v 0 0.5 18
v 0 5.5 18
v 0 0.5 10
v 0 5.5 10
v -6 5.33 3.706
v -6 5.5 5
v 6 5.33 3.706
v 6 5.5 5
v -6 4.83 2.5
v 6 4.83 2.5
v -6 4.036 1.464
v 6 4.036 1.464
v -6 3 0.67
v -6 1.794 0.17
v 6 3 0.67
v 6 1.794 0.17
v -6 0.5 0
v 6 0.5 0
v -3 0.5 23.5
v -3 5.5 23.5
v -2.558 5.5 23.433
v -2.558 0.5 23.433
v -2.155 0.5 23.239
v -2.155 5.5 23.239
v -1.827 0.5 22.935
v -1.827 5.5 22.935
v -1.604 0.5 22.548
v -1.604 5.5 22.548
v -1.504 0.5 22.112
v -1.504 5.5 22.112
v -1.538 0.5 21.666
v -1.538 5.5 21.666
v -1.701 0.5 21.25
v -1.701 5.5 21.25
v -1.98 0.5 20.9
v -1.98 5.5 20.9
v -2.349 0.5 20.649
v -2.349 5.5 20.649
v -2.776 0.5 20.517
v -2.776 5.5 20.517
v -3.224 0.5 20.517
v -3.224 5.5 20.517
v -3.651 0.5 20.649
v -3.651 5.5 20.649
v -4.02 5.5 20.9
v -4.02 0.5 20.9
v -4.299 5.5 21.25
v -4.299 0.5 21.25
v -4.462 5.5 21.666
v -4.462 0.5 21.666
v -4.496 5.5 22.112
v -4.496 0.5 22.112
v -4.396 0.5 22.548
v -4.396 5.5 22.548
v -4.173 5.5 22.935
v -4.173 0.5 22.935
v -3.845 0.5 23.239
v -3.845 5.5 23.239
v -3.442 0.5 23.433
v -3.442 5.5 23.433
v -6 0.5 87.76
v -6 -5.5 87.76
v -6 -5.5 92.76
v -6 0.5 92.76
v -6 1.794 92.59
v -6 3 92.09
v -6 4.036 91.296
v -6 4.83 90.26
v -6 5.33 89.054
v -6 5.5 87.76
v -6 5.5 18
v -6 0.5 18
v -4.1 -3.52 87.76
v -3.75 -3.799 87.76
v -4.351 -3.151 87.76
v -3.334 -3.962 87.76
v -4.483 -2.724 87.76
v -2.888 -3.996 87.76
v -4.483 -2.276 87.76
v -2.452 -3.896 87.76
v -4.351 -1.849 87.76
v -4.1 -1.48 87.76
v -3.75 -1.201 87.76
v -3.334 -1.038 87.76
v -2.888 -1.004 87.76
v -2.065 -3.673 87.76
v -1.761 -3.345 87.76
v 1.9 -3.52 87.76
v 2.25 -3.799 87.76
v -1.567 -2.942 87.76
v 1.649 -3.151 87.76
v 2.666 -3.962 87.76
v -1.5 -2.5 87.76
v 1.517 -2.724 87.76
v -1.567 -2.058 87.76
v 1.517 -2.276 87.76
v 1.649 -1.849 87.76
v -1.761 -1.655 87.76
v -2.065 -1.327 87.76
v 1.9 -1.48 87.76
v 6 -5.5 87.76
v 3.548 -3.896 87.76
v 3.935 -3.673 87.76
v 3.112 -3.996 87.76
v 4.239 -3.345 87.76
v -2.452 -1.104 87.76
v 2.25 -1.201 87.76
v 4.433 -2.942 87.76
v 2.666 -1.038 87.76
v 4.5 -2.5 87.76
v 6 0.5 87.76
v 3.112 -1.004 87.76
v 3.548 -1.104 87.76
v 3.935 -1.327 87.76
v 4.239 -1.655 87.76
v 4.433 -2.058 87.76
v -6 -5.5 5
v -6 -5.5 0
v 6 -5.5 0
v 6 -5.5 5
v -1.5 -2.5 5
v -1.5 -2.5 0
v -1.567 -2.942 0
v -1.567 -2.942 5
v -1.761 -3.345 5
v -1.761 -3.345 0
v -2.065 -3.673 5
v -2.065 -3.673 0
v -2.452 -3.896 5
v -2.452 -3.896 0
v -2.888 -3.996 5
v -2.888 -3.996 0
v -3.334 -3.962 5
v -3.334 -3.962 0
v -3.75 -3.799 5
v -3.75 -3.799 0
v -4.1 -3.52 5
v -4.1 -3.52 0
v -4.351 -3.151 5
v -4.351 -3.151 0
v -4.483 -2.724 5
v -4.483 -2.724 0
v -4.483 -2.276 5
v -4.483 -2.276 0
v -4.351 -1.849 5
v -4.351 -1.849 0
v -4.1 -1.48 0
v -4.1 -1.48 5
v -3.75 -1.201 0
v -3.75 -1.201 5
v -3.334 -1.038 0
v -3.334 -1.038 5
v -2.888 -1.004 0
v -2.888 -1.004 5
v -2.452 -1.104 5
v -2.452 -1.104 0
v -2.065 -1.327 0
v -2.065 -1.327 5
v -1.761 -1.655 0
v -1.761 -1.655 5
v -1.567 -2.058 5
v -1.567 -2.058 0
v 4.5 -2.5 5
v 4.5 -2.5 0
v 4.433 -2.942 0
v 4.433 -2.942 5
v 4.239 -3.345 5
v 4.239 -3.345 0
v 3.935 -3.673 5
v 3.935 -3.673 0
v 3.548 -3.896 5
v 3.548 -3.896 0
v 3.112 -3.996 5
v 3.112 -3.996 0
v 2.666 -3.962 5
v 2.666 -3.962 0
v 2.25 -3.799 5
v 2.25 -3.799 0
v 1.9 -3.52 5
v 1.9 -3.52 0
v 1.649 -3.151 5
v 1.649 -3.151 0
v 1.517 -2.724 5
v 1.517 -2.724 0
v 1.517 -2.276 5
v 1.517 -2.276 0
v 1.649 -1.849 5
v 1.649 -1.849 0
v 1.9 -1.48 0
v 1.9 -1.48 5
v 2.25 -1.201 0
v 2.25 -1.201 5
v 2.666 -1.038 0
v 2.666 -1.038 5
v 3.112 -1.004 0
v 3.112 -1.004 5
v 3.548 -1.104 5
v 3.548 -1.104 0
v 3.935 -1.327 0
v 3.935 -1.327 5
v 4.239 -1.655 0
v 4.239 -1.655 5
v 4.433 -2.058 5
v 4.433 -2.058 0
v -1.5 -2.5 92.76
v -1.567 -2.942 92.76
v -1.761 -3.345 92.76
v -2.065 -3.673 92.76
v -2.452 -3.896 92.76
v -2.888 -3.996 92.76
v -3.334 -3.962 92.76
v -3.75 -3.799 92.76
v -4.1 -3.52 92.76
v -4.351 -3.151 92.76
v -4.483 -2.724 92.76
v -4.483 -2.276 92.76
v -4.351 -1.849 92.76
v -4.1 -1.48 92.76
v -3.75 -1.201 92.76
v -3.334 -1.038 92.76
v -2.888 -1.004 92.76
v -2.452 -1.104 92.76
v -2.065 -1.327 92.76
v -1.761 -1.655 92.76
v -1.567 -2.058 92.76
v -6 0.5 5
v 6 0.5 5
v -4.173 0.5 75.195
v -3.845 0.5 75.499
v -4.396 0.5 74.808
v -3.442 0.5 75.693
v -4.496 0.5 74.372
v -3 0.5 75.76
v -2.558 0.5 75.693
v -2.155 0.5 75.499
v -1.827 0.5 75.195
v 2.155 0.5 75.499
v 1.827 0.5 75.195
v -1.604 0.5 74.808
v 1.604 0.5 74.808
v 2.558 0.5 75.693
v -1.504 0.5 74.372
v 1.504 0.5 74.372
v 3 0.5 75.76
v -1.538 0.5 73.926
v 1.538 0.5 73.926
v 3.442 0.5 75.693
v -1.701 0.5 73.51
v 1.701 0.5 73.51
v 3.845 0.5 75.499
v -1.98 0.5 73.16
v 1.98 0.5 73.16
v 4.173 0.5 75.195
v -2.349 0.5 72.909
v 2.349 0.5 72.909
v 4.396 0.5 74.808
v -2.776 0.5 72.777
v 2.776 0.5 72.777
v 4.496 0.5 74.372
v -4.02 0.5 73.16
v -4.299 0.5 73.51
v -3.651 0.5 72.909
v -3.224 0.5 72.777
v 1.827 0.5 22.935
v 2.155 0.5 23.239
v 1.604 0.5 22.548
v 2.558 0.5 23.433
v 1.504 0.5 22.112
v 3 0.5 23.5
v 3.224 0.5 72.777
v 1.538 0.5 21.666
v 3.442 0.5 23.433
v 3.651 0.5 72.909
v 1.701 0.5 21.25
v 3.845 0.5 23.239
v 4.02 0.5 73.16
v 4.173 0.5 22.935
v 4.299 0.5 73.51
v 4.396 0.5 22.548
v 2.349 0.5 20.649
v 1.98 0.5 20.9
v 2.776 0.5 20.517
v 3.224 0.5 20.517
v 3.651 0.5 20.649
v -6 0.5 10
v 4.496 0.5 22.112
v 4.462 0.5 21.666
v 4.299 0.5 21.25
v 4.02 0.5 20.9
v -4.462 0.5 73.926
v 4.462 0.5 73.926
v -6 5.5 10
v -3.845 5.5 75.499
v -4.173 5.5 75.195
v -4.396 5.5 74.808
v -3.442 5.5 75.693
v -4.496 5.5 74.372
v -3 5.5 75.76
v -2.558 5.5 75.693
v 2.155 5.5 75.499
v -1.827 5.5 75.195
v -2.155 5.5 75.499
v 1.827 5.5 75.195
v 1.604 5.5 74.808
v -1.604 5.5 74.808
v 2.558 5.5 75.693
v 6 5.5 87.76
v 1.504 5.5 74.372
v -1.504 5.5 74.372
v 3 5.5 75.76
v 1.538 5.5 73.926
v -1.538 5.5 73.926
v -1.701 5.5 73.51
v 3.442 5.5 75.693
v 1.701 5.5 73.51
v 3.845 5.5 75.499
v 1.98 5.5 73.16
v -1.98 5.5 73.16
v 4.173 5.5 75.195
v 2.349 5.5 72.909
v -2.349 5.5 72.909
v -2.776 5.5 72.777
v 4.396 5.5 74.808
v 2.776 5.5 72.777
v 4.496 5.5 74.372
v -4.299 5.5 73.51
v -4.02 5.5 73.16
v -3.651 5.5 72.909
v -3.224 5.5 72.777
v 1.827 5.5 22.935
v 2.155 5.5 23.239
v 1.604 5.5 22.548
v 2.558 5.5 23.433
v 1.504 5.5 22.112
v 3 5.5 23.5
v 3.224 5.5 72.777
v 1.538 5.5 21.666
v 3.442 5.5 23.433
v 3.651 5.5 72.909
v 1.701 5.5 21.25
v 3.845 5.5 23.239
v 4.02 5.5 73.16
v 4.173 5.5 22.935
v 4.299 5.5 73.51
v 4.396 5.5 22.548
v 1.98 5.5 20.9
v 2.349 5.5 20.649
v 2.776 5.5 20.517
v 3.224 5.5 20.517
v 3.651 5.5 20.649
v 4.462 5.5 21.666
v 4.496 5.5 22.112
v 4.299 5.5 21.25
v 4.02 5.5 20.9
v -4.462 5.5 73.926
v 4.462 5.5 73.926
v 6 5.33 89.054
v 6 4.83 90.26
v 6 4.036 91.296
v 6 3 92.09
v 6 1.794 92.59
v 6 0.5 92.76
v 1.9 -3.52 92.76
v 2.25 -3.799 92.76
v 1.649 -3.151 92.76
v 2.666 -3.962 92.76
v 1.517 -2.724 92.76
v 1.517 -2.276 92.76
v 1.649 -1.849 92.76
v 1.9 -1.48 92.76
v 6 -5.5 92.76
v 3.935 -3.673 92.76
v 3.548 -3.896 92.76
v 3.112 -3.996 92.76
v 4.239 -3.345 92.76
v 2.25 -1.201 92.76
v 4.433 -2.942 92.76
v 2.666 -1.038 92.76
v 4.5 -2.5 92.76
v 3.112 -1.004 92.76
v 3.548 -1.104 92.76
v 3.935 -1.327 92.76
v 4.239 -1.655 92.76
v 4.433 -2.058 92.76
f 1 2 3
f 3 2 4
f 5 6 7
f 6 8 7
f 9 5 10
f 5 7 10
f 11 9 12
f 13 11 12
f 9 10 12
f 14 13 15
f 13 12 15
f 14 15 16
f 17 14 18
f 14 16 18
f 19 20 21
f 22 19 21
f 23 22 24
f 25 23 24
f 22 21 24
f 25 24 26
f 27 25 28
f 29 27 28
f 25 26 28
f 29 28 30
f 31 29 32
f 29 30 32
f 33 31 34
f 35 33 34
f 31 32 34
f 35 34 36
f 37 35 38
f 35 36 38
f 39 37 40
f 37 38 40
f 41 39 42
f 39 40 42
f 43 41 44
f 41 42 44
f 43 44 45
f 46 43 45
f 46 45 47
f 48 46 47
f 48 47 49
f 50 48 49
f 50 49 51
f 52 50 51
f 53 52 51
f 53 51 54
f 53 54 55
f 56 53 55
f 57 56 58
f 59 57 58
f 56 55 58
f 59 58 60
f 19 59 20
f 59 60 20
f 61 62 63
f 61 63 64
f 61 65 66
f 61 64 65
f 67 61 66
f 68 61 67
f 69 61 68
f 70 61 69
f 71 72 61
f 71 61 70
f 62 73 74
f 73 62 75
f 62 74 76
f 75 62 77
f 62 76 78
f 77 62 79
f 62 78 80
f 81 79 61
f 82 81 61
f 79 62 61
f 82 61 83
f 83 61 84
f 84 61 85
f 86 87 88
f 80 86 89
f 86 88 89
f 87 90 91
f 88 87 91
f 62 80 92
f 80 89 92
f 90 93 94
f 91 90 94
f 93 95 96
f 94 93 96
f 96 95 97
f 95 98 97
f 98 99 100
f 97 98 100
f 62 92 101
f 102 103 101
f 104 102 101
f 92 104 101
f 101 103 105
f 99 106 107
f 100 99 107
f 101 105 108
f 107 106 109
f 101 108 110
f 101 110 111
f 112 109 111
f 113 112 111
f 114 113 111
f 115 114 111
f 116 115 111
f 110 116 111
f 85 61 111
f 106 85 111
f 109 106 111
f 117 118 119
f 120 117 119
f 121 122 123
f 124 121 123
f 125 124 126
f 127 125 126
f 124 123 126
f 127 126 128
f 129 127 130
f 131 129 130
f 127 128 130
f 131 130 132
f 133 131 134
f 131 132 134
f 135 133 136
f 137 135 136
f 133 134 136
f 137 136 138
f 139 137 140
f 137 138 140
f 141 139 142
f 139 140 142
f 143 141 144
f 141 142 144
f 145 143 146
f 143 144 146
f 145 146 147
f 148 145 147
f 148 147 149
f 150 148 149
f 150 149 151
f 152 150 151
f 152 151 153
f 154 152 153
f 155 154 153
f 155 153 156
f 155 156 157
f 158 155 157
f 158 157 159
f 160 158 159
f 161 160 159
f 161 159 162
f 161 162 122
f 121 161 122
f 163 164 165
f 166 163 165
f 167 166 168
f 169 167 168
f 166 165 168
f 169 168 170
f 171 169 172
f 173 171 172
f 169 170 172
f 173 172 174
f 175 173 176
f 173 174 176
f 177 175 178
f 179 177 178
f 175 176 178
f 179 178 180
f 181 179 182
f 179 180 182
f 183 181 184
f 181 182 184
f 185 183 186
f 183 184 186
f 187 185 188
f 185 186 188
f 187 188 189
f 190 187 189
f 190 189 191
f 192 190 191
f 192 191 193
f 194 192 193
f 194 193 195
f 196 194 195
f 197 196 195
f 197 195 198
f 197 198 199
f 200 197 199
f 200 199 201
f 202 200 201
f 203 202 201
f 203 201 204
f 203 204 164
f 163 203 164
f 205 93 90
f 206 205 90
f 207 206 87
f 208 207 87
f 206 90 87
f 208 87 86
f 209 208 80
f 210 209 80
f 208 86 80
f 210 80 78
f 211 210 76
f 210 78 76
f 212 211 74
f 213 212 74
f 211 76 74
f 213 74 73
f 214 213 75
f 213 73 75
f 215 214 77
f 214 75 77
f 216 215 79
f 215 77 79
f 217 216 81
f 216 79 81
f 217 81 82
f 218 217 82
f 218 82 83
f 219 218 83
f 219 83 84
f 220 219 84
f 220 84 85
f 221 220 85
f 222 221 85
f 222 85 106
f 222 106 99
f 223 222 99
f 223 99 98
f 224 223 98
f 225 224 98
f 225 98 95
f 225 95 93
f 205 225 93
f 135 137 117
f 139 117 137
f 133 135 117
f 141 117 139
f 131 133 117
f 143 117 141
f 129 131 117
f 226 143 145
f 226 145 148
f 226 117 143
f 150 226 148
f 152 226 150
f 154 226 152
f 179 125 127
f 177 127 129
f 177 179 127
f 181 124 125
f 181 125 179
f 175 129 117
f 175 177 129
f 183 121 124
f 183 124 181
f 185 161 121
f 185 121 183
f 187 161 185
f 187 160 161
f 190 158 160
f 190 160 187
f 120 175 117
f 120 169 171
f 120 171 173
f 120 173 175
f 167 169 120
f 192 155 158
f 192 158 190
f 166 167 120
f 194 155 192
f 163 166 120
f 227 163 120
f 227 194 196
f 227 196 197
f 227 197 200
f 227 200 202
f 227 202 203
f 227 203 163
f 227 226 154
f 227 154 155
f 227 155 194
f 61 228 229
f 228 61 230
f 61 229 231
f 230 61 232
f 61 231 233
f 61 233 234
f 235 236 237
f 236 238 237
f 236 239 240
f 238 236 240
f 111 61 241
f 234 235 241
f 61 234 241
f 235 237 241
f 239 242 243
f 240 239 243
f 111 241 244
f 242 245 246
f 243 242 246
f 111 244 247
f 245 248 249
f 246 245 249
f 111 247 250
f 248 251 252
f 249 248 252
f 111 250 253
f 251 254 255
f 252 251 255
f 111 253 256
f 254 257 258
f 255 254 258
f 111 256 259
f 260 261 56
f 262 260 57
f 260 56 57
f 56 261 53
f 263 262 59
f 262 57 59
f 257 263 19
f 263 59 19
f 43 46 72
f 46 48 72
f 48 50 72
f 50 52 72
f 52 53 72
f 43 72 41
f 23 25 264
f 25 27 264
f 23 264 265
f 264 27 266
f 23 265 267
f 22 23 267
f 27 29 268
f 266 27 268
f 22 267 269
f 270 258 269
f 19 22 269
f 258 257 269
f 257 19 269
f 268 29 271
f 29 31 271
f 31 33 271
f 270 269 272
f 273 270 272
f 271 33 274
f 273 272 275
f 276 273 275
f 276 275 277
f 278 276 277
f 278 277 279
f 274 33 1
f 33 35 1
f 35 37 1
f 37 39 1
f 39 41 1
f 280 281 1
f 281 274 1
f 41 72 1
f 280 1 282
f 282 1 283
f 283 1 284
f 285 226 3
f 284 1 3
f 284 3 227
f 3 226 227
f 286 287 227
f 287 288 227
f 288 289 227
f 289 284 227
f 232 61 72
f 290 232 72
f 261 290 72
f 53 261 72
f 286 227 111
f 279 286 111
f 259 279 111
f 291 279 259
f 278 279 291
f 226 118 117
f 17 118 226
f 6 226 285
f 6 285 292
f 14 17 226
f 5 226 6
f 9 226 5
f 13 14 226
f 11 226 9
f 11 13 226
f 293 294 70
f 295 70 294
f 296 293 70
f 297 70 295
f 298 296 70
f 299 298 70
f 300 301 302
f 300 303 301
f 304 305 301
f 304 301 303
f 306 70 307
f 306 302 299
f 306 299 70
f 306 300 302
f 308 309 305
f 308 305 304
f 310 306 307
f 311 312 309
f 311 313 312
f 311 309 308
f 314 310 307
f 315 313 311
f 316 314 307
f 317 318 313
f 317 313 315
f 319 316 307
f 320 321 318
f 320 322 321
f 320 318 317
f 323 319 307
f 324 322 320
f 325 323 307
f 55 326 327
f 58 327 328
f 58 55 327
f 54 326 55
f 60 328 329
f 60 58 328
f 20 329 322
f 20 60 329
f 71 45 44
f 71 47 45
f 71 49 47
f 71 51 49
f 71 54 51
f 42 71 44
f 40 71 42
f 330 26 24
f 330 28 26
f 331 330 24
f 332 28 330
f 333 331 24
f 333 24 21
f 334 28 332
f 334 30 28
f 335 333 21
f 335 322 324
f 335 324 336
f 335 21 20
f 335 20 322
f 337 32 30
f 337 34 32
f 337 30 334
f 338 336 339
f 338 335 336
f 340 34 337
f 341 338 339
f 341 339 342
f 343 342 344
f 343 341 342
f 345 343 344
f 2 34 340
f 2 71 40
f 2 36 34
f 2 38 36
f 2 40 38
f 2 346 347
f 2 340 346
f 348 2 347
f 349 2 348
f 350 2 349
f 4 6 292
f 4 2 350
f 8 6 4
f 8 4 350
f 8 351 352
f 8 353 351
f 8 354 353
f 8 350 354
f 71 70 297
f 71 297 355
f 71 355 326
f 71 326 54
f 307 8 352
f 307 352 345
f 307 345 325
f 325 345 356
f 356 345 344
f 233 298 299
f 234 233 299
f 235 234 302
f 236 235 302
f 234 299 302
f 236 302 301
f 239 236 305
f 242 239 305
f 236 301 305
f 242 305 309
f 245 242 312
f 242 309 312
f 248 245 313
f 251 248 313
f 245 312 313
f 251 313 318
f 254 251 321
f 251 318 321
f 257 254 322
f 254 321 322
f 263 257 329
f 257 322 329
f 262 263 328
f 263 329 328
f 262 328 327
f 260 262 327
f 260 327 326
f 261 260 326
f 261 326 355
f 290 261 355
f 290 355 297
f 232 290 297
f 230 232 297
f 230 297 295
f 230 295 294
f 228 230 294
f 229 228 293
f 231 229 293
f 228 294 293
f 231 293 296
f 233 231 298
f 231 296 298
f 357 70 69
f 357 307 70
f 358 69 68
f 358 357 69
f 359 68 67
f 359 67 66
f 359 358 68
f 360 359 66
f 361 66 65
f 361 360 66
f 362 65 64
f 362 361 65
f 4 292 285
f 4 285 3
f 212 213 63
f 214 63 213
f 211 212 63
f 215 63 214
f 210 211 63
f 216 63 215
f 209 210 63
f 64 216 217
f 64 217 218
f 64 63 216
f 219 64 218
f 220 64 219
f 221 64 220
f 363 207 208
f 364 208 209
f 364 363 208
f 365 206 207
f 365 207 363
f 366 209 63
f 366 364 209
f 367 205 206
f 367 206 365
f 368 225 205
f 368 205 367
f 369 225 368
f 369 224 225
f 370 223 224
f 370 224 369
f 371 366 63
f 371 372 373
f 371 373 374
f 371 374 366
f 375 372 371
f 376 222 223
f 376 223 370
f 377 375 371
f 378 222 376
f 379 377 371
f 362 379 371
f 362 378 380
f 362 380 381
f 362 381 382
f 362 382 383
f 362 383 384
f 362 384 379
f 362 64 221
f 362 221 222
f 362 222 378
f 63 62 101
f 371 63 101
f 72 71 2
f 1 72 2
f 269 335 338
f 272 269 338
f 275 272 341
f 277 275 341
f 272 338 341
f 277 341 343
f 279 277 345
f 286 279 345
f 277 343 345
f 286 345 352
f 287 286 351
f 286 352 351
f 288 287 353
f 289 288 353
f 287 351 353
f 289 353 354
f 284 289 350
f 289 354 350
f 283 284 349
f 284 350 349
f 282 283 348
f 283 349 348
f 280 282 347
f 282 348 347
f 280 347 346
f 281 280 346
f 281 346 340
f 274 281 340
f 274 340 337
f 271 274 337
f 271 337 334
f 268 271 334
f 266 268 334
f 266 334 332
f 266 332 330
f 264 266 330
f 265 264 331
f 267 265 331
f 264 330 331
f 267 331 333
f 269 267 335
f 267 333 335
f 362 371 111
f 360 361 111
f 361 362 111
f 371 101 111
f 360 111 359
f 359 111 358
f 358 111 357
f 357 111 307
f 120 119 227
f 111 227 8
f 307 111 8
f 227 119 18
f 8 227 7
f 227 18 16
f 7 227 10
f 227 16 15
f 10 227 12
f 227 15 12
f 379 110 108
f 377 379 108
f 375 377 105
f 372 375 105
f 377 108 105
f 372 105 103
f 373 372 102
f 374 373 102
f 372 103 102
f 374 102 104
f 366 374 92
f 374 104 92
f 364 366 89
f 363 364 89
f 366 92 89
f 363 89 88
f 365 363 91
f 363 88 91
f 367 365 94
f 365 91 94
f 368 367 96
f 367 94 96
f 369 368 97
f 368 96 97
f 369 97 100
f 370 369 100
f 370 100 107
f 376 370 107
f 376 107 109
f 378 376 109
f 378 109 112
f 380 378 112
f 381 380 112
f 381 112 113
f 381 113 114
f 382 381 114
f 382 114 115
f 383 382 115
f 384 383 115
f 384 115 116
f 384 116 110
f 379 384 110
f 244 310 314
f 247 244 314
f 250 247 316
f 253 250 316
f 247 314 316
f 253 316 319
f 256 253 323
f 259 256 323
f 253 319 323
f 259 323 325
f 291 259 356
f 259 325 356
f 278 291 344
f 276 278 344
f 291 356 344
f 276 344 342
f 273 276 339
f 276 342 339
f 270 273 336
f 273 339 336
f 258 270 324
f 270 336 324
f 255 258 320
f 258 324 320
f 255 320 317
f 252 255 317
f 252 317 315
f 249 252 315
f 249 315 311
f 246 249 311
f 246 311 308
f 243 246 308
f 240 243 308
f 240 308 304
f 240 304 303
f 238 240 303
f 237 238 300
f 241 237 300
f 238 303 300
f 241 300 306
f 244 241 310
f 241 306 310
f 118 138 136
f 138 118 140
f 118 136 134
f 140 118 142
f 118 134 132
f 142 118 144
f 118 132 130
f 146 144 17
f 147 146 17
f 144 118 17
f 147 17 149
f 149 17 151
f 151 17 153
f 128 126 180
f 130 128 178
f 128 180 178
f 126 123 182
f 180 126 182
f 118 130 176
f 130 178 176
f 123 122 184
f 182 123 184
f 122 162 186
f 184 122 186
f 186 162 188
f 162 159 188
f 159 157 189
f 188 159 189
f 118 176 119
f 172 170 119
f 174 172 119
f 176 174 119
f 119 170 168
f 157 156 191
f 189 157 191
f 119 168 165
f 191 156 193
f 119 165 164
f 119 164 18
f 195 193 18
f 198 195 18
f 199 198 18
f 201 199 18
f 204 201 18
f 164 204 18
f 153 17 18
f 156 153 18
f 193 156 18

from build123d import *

# Parameters (mm, degrees)
SKETCH1_W      = 12
SKETCH1_H      = 11
EXTRUDE1_DEPTH = 5
SKETCH2_W      = 12
SKETCH2_H      = 5
EXTRUDE2_DEPTH = 82.76
SKETCH3_W      = 12
SKETCH3_H      = 11
EXTRUDE3_DEPTH = 5
EXTRUDE4_REACH = 95.116
SKETCH5_R      = 1.5
SKETCH8_W      = 6
SKETCH8_H      = 8
EXTRUDE5_DEPTH = 5
SKETCH9_R      = 1.5
EXTRUDE6_DEPTH = 5
FILLET1_R      = 5


with BuildPart() as part:
    # Sketch1 → Extrude1 (new body)
    with BuildSketch(Plane.XY):
        Rectangle(SKETCH1_W, SKETCH1_H)
    extrude(amount=EXTRUDE1_DEPTH)

    # Sketch2 → Extrude2 (add)
    with BuildSketch(Plane.XY.offset(5)):
        with Locations((0, 3)):
            Rectangle(SKETCH2_W, SKETCH2_H)
    extrude(amount=EXTRUDE2_DEPTH)

    # Sketch3 → Extrude3 (add)
    with BuildSketch(Plane.XY.offset(87.76)):
        Rectangle(SKETCH3_W, SKETCH3_H)
    extrude(amount=EXTRUDE3_DEPTH)

    # Extrude4: up to this face of the body (flat: up to its plane)
    extrude4_end = Plane(part.part.faces().sort_by_distance((0, 0, 92.76))[0])
    # Sketch5 → Extrude4 (cut, up to the picked face)
    with BuildSketch(Plane(origin=(0, 0, 0), x_dir=(-1, 0, 0), z_dir=(0, 0, -1)), mode=Mode.PRIVATE) as extrude4_sk1:
        with Locations(Location((-3, -2.5, 0), (0, 0, 180))):
            Circle(SKETCH5_R)
    extrude4_tool1 = split(extrude(extrude4_sk1.sketch, amount=-EXTRUDE4_REACH, mode=Mode.PRIVATE), bisect_by=extrude4_end, keep=Keep.BOTH, mode=Mode.PRIVATE)
    # Sketch5 → Extrude4 (cut, up to the picked face)
    with BuildSketch(Plane(origin=(0, 0, 0), x_dir=(-1, 0, 0), z_dir=(0, 0, -1)), mode=Mode.PRIVATE) as extrude4_sk2:
        with Locations(Location((3, -2.5, 0), (0, 0, 180))):
            Circle(SKETCH5_R)
    extrude4_tool2 = split(extrude(extrude4_sk2.sketch, amount=-EXTRUDE4_REACH, mode=Mode.PRIVATE), bisect_by=extrude4_end, keep=Keep.BOTH, mode=Mode.PRIVATE)
    add(extrude4_tool1.solids().sort_by(Axis((3, -2.5, 0), (0, 0, 1)))[0], mode=Mode.SUBTRACT)
    add(extrude4_tool2.solids().sort_by(Axis((-3, -2.5, 0), (0, 0, 1)))[0], mode=Mode.SUBTRACT)

    # Sketch8 → Extrude5 (cut)
    with BuildSketch(Plane(origin=(0, 5.5, 0), x_dir=(1, 0, 0), z_dir=(0, 1, 0))):
        with Locations((-3, -14)):
            Rectangle(SKETCH8_W, SKETCH8_H)
    extrude(amount=-EXTRUDE5_DEPTH, mode=Mode.SUBTRACT)

    # Sketch9 → Extrude6 (cut)
    with BuildSketch(Plane(origin=(0, 5.5, 0), x_dir=(1, 0, 0), z_dir=(0, 1, 0))):
        with Locations(Location((-3, -22, 0), (0, 0, 270))):
            Circle(SKETCH9_R)
        with Locations(Location((3, -22, 0), (0, 0, 270))):
            Circle(SKETCH9_R)
        with Locations(Location((3, -74.26, 0), (0, 0, 270))):
            Circle(SKETCH9_R)
        with Locations(Location((-3, -74.26, 0), (0, 0, 270))):
            Circle(SKETCH9_R)
    extrude(amount=-EXTRUDE6_DEPTH, mode=Mode.SUBTRACT)

    # Fillet1
    fillet1_edges = [part.edges().sort_by_distance(p)[0] for p in [
        (0, 5.5, 92.76),
        (0, 5.5, 0),
    ]]
    fillet(fillet1_edges, radius=FILLET1_R)


solid = part.part
